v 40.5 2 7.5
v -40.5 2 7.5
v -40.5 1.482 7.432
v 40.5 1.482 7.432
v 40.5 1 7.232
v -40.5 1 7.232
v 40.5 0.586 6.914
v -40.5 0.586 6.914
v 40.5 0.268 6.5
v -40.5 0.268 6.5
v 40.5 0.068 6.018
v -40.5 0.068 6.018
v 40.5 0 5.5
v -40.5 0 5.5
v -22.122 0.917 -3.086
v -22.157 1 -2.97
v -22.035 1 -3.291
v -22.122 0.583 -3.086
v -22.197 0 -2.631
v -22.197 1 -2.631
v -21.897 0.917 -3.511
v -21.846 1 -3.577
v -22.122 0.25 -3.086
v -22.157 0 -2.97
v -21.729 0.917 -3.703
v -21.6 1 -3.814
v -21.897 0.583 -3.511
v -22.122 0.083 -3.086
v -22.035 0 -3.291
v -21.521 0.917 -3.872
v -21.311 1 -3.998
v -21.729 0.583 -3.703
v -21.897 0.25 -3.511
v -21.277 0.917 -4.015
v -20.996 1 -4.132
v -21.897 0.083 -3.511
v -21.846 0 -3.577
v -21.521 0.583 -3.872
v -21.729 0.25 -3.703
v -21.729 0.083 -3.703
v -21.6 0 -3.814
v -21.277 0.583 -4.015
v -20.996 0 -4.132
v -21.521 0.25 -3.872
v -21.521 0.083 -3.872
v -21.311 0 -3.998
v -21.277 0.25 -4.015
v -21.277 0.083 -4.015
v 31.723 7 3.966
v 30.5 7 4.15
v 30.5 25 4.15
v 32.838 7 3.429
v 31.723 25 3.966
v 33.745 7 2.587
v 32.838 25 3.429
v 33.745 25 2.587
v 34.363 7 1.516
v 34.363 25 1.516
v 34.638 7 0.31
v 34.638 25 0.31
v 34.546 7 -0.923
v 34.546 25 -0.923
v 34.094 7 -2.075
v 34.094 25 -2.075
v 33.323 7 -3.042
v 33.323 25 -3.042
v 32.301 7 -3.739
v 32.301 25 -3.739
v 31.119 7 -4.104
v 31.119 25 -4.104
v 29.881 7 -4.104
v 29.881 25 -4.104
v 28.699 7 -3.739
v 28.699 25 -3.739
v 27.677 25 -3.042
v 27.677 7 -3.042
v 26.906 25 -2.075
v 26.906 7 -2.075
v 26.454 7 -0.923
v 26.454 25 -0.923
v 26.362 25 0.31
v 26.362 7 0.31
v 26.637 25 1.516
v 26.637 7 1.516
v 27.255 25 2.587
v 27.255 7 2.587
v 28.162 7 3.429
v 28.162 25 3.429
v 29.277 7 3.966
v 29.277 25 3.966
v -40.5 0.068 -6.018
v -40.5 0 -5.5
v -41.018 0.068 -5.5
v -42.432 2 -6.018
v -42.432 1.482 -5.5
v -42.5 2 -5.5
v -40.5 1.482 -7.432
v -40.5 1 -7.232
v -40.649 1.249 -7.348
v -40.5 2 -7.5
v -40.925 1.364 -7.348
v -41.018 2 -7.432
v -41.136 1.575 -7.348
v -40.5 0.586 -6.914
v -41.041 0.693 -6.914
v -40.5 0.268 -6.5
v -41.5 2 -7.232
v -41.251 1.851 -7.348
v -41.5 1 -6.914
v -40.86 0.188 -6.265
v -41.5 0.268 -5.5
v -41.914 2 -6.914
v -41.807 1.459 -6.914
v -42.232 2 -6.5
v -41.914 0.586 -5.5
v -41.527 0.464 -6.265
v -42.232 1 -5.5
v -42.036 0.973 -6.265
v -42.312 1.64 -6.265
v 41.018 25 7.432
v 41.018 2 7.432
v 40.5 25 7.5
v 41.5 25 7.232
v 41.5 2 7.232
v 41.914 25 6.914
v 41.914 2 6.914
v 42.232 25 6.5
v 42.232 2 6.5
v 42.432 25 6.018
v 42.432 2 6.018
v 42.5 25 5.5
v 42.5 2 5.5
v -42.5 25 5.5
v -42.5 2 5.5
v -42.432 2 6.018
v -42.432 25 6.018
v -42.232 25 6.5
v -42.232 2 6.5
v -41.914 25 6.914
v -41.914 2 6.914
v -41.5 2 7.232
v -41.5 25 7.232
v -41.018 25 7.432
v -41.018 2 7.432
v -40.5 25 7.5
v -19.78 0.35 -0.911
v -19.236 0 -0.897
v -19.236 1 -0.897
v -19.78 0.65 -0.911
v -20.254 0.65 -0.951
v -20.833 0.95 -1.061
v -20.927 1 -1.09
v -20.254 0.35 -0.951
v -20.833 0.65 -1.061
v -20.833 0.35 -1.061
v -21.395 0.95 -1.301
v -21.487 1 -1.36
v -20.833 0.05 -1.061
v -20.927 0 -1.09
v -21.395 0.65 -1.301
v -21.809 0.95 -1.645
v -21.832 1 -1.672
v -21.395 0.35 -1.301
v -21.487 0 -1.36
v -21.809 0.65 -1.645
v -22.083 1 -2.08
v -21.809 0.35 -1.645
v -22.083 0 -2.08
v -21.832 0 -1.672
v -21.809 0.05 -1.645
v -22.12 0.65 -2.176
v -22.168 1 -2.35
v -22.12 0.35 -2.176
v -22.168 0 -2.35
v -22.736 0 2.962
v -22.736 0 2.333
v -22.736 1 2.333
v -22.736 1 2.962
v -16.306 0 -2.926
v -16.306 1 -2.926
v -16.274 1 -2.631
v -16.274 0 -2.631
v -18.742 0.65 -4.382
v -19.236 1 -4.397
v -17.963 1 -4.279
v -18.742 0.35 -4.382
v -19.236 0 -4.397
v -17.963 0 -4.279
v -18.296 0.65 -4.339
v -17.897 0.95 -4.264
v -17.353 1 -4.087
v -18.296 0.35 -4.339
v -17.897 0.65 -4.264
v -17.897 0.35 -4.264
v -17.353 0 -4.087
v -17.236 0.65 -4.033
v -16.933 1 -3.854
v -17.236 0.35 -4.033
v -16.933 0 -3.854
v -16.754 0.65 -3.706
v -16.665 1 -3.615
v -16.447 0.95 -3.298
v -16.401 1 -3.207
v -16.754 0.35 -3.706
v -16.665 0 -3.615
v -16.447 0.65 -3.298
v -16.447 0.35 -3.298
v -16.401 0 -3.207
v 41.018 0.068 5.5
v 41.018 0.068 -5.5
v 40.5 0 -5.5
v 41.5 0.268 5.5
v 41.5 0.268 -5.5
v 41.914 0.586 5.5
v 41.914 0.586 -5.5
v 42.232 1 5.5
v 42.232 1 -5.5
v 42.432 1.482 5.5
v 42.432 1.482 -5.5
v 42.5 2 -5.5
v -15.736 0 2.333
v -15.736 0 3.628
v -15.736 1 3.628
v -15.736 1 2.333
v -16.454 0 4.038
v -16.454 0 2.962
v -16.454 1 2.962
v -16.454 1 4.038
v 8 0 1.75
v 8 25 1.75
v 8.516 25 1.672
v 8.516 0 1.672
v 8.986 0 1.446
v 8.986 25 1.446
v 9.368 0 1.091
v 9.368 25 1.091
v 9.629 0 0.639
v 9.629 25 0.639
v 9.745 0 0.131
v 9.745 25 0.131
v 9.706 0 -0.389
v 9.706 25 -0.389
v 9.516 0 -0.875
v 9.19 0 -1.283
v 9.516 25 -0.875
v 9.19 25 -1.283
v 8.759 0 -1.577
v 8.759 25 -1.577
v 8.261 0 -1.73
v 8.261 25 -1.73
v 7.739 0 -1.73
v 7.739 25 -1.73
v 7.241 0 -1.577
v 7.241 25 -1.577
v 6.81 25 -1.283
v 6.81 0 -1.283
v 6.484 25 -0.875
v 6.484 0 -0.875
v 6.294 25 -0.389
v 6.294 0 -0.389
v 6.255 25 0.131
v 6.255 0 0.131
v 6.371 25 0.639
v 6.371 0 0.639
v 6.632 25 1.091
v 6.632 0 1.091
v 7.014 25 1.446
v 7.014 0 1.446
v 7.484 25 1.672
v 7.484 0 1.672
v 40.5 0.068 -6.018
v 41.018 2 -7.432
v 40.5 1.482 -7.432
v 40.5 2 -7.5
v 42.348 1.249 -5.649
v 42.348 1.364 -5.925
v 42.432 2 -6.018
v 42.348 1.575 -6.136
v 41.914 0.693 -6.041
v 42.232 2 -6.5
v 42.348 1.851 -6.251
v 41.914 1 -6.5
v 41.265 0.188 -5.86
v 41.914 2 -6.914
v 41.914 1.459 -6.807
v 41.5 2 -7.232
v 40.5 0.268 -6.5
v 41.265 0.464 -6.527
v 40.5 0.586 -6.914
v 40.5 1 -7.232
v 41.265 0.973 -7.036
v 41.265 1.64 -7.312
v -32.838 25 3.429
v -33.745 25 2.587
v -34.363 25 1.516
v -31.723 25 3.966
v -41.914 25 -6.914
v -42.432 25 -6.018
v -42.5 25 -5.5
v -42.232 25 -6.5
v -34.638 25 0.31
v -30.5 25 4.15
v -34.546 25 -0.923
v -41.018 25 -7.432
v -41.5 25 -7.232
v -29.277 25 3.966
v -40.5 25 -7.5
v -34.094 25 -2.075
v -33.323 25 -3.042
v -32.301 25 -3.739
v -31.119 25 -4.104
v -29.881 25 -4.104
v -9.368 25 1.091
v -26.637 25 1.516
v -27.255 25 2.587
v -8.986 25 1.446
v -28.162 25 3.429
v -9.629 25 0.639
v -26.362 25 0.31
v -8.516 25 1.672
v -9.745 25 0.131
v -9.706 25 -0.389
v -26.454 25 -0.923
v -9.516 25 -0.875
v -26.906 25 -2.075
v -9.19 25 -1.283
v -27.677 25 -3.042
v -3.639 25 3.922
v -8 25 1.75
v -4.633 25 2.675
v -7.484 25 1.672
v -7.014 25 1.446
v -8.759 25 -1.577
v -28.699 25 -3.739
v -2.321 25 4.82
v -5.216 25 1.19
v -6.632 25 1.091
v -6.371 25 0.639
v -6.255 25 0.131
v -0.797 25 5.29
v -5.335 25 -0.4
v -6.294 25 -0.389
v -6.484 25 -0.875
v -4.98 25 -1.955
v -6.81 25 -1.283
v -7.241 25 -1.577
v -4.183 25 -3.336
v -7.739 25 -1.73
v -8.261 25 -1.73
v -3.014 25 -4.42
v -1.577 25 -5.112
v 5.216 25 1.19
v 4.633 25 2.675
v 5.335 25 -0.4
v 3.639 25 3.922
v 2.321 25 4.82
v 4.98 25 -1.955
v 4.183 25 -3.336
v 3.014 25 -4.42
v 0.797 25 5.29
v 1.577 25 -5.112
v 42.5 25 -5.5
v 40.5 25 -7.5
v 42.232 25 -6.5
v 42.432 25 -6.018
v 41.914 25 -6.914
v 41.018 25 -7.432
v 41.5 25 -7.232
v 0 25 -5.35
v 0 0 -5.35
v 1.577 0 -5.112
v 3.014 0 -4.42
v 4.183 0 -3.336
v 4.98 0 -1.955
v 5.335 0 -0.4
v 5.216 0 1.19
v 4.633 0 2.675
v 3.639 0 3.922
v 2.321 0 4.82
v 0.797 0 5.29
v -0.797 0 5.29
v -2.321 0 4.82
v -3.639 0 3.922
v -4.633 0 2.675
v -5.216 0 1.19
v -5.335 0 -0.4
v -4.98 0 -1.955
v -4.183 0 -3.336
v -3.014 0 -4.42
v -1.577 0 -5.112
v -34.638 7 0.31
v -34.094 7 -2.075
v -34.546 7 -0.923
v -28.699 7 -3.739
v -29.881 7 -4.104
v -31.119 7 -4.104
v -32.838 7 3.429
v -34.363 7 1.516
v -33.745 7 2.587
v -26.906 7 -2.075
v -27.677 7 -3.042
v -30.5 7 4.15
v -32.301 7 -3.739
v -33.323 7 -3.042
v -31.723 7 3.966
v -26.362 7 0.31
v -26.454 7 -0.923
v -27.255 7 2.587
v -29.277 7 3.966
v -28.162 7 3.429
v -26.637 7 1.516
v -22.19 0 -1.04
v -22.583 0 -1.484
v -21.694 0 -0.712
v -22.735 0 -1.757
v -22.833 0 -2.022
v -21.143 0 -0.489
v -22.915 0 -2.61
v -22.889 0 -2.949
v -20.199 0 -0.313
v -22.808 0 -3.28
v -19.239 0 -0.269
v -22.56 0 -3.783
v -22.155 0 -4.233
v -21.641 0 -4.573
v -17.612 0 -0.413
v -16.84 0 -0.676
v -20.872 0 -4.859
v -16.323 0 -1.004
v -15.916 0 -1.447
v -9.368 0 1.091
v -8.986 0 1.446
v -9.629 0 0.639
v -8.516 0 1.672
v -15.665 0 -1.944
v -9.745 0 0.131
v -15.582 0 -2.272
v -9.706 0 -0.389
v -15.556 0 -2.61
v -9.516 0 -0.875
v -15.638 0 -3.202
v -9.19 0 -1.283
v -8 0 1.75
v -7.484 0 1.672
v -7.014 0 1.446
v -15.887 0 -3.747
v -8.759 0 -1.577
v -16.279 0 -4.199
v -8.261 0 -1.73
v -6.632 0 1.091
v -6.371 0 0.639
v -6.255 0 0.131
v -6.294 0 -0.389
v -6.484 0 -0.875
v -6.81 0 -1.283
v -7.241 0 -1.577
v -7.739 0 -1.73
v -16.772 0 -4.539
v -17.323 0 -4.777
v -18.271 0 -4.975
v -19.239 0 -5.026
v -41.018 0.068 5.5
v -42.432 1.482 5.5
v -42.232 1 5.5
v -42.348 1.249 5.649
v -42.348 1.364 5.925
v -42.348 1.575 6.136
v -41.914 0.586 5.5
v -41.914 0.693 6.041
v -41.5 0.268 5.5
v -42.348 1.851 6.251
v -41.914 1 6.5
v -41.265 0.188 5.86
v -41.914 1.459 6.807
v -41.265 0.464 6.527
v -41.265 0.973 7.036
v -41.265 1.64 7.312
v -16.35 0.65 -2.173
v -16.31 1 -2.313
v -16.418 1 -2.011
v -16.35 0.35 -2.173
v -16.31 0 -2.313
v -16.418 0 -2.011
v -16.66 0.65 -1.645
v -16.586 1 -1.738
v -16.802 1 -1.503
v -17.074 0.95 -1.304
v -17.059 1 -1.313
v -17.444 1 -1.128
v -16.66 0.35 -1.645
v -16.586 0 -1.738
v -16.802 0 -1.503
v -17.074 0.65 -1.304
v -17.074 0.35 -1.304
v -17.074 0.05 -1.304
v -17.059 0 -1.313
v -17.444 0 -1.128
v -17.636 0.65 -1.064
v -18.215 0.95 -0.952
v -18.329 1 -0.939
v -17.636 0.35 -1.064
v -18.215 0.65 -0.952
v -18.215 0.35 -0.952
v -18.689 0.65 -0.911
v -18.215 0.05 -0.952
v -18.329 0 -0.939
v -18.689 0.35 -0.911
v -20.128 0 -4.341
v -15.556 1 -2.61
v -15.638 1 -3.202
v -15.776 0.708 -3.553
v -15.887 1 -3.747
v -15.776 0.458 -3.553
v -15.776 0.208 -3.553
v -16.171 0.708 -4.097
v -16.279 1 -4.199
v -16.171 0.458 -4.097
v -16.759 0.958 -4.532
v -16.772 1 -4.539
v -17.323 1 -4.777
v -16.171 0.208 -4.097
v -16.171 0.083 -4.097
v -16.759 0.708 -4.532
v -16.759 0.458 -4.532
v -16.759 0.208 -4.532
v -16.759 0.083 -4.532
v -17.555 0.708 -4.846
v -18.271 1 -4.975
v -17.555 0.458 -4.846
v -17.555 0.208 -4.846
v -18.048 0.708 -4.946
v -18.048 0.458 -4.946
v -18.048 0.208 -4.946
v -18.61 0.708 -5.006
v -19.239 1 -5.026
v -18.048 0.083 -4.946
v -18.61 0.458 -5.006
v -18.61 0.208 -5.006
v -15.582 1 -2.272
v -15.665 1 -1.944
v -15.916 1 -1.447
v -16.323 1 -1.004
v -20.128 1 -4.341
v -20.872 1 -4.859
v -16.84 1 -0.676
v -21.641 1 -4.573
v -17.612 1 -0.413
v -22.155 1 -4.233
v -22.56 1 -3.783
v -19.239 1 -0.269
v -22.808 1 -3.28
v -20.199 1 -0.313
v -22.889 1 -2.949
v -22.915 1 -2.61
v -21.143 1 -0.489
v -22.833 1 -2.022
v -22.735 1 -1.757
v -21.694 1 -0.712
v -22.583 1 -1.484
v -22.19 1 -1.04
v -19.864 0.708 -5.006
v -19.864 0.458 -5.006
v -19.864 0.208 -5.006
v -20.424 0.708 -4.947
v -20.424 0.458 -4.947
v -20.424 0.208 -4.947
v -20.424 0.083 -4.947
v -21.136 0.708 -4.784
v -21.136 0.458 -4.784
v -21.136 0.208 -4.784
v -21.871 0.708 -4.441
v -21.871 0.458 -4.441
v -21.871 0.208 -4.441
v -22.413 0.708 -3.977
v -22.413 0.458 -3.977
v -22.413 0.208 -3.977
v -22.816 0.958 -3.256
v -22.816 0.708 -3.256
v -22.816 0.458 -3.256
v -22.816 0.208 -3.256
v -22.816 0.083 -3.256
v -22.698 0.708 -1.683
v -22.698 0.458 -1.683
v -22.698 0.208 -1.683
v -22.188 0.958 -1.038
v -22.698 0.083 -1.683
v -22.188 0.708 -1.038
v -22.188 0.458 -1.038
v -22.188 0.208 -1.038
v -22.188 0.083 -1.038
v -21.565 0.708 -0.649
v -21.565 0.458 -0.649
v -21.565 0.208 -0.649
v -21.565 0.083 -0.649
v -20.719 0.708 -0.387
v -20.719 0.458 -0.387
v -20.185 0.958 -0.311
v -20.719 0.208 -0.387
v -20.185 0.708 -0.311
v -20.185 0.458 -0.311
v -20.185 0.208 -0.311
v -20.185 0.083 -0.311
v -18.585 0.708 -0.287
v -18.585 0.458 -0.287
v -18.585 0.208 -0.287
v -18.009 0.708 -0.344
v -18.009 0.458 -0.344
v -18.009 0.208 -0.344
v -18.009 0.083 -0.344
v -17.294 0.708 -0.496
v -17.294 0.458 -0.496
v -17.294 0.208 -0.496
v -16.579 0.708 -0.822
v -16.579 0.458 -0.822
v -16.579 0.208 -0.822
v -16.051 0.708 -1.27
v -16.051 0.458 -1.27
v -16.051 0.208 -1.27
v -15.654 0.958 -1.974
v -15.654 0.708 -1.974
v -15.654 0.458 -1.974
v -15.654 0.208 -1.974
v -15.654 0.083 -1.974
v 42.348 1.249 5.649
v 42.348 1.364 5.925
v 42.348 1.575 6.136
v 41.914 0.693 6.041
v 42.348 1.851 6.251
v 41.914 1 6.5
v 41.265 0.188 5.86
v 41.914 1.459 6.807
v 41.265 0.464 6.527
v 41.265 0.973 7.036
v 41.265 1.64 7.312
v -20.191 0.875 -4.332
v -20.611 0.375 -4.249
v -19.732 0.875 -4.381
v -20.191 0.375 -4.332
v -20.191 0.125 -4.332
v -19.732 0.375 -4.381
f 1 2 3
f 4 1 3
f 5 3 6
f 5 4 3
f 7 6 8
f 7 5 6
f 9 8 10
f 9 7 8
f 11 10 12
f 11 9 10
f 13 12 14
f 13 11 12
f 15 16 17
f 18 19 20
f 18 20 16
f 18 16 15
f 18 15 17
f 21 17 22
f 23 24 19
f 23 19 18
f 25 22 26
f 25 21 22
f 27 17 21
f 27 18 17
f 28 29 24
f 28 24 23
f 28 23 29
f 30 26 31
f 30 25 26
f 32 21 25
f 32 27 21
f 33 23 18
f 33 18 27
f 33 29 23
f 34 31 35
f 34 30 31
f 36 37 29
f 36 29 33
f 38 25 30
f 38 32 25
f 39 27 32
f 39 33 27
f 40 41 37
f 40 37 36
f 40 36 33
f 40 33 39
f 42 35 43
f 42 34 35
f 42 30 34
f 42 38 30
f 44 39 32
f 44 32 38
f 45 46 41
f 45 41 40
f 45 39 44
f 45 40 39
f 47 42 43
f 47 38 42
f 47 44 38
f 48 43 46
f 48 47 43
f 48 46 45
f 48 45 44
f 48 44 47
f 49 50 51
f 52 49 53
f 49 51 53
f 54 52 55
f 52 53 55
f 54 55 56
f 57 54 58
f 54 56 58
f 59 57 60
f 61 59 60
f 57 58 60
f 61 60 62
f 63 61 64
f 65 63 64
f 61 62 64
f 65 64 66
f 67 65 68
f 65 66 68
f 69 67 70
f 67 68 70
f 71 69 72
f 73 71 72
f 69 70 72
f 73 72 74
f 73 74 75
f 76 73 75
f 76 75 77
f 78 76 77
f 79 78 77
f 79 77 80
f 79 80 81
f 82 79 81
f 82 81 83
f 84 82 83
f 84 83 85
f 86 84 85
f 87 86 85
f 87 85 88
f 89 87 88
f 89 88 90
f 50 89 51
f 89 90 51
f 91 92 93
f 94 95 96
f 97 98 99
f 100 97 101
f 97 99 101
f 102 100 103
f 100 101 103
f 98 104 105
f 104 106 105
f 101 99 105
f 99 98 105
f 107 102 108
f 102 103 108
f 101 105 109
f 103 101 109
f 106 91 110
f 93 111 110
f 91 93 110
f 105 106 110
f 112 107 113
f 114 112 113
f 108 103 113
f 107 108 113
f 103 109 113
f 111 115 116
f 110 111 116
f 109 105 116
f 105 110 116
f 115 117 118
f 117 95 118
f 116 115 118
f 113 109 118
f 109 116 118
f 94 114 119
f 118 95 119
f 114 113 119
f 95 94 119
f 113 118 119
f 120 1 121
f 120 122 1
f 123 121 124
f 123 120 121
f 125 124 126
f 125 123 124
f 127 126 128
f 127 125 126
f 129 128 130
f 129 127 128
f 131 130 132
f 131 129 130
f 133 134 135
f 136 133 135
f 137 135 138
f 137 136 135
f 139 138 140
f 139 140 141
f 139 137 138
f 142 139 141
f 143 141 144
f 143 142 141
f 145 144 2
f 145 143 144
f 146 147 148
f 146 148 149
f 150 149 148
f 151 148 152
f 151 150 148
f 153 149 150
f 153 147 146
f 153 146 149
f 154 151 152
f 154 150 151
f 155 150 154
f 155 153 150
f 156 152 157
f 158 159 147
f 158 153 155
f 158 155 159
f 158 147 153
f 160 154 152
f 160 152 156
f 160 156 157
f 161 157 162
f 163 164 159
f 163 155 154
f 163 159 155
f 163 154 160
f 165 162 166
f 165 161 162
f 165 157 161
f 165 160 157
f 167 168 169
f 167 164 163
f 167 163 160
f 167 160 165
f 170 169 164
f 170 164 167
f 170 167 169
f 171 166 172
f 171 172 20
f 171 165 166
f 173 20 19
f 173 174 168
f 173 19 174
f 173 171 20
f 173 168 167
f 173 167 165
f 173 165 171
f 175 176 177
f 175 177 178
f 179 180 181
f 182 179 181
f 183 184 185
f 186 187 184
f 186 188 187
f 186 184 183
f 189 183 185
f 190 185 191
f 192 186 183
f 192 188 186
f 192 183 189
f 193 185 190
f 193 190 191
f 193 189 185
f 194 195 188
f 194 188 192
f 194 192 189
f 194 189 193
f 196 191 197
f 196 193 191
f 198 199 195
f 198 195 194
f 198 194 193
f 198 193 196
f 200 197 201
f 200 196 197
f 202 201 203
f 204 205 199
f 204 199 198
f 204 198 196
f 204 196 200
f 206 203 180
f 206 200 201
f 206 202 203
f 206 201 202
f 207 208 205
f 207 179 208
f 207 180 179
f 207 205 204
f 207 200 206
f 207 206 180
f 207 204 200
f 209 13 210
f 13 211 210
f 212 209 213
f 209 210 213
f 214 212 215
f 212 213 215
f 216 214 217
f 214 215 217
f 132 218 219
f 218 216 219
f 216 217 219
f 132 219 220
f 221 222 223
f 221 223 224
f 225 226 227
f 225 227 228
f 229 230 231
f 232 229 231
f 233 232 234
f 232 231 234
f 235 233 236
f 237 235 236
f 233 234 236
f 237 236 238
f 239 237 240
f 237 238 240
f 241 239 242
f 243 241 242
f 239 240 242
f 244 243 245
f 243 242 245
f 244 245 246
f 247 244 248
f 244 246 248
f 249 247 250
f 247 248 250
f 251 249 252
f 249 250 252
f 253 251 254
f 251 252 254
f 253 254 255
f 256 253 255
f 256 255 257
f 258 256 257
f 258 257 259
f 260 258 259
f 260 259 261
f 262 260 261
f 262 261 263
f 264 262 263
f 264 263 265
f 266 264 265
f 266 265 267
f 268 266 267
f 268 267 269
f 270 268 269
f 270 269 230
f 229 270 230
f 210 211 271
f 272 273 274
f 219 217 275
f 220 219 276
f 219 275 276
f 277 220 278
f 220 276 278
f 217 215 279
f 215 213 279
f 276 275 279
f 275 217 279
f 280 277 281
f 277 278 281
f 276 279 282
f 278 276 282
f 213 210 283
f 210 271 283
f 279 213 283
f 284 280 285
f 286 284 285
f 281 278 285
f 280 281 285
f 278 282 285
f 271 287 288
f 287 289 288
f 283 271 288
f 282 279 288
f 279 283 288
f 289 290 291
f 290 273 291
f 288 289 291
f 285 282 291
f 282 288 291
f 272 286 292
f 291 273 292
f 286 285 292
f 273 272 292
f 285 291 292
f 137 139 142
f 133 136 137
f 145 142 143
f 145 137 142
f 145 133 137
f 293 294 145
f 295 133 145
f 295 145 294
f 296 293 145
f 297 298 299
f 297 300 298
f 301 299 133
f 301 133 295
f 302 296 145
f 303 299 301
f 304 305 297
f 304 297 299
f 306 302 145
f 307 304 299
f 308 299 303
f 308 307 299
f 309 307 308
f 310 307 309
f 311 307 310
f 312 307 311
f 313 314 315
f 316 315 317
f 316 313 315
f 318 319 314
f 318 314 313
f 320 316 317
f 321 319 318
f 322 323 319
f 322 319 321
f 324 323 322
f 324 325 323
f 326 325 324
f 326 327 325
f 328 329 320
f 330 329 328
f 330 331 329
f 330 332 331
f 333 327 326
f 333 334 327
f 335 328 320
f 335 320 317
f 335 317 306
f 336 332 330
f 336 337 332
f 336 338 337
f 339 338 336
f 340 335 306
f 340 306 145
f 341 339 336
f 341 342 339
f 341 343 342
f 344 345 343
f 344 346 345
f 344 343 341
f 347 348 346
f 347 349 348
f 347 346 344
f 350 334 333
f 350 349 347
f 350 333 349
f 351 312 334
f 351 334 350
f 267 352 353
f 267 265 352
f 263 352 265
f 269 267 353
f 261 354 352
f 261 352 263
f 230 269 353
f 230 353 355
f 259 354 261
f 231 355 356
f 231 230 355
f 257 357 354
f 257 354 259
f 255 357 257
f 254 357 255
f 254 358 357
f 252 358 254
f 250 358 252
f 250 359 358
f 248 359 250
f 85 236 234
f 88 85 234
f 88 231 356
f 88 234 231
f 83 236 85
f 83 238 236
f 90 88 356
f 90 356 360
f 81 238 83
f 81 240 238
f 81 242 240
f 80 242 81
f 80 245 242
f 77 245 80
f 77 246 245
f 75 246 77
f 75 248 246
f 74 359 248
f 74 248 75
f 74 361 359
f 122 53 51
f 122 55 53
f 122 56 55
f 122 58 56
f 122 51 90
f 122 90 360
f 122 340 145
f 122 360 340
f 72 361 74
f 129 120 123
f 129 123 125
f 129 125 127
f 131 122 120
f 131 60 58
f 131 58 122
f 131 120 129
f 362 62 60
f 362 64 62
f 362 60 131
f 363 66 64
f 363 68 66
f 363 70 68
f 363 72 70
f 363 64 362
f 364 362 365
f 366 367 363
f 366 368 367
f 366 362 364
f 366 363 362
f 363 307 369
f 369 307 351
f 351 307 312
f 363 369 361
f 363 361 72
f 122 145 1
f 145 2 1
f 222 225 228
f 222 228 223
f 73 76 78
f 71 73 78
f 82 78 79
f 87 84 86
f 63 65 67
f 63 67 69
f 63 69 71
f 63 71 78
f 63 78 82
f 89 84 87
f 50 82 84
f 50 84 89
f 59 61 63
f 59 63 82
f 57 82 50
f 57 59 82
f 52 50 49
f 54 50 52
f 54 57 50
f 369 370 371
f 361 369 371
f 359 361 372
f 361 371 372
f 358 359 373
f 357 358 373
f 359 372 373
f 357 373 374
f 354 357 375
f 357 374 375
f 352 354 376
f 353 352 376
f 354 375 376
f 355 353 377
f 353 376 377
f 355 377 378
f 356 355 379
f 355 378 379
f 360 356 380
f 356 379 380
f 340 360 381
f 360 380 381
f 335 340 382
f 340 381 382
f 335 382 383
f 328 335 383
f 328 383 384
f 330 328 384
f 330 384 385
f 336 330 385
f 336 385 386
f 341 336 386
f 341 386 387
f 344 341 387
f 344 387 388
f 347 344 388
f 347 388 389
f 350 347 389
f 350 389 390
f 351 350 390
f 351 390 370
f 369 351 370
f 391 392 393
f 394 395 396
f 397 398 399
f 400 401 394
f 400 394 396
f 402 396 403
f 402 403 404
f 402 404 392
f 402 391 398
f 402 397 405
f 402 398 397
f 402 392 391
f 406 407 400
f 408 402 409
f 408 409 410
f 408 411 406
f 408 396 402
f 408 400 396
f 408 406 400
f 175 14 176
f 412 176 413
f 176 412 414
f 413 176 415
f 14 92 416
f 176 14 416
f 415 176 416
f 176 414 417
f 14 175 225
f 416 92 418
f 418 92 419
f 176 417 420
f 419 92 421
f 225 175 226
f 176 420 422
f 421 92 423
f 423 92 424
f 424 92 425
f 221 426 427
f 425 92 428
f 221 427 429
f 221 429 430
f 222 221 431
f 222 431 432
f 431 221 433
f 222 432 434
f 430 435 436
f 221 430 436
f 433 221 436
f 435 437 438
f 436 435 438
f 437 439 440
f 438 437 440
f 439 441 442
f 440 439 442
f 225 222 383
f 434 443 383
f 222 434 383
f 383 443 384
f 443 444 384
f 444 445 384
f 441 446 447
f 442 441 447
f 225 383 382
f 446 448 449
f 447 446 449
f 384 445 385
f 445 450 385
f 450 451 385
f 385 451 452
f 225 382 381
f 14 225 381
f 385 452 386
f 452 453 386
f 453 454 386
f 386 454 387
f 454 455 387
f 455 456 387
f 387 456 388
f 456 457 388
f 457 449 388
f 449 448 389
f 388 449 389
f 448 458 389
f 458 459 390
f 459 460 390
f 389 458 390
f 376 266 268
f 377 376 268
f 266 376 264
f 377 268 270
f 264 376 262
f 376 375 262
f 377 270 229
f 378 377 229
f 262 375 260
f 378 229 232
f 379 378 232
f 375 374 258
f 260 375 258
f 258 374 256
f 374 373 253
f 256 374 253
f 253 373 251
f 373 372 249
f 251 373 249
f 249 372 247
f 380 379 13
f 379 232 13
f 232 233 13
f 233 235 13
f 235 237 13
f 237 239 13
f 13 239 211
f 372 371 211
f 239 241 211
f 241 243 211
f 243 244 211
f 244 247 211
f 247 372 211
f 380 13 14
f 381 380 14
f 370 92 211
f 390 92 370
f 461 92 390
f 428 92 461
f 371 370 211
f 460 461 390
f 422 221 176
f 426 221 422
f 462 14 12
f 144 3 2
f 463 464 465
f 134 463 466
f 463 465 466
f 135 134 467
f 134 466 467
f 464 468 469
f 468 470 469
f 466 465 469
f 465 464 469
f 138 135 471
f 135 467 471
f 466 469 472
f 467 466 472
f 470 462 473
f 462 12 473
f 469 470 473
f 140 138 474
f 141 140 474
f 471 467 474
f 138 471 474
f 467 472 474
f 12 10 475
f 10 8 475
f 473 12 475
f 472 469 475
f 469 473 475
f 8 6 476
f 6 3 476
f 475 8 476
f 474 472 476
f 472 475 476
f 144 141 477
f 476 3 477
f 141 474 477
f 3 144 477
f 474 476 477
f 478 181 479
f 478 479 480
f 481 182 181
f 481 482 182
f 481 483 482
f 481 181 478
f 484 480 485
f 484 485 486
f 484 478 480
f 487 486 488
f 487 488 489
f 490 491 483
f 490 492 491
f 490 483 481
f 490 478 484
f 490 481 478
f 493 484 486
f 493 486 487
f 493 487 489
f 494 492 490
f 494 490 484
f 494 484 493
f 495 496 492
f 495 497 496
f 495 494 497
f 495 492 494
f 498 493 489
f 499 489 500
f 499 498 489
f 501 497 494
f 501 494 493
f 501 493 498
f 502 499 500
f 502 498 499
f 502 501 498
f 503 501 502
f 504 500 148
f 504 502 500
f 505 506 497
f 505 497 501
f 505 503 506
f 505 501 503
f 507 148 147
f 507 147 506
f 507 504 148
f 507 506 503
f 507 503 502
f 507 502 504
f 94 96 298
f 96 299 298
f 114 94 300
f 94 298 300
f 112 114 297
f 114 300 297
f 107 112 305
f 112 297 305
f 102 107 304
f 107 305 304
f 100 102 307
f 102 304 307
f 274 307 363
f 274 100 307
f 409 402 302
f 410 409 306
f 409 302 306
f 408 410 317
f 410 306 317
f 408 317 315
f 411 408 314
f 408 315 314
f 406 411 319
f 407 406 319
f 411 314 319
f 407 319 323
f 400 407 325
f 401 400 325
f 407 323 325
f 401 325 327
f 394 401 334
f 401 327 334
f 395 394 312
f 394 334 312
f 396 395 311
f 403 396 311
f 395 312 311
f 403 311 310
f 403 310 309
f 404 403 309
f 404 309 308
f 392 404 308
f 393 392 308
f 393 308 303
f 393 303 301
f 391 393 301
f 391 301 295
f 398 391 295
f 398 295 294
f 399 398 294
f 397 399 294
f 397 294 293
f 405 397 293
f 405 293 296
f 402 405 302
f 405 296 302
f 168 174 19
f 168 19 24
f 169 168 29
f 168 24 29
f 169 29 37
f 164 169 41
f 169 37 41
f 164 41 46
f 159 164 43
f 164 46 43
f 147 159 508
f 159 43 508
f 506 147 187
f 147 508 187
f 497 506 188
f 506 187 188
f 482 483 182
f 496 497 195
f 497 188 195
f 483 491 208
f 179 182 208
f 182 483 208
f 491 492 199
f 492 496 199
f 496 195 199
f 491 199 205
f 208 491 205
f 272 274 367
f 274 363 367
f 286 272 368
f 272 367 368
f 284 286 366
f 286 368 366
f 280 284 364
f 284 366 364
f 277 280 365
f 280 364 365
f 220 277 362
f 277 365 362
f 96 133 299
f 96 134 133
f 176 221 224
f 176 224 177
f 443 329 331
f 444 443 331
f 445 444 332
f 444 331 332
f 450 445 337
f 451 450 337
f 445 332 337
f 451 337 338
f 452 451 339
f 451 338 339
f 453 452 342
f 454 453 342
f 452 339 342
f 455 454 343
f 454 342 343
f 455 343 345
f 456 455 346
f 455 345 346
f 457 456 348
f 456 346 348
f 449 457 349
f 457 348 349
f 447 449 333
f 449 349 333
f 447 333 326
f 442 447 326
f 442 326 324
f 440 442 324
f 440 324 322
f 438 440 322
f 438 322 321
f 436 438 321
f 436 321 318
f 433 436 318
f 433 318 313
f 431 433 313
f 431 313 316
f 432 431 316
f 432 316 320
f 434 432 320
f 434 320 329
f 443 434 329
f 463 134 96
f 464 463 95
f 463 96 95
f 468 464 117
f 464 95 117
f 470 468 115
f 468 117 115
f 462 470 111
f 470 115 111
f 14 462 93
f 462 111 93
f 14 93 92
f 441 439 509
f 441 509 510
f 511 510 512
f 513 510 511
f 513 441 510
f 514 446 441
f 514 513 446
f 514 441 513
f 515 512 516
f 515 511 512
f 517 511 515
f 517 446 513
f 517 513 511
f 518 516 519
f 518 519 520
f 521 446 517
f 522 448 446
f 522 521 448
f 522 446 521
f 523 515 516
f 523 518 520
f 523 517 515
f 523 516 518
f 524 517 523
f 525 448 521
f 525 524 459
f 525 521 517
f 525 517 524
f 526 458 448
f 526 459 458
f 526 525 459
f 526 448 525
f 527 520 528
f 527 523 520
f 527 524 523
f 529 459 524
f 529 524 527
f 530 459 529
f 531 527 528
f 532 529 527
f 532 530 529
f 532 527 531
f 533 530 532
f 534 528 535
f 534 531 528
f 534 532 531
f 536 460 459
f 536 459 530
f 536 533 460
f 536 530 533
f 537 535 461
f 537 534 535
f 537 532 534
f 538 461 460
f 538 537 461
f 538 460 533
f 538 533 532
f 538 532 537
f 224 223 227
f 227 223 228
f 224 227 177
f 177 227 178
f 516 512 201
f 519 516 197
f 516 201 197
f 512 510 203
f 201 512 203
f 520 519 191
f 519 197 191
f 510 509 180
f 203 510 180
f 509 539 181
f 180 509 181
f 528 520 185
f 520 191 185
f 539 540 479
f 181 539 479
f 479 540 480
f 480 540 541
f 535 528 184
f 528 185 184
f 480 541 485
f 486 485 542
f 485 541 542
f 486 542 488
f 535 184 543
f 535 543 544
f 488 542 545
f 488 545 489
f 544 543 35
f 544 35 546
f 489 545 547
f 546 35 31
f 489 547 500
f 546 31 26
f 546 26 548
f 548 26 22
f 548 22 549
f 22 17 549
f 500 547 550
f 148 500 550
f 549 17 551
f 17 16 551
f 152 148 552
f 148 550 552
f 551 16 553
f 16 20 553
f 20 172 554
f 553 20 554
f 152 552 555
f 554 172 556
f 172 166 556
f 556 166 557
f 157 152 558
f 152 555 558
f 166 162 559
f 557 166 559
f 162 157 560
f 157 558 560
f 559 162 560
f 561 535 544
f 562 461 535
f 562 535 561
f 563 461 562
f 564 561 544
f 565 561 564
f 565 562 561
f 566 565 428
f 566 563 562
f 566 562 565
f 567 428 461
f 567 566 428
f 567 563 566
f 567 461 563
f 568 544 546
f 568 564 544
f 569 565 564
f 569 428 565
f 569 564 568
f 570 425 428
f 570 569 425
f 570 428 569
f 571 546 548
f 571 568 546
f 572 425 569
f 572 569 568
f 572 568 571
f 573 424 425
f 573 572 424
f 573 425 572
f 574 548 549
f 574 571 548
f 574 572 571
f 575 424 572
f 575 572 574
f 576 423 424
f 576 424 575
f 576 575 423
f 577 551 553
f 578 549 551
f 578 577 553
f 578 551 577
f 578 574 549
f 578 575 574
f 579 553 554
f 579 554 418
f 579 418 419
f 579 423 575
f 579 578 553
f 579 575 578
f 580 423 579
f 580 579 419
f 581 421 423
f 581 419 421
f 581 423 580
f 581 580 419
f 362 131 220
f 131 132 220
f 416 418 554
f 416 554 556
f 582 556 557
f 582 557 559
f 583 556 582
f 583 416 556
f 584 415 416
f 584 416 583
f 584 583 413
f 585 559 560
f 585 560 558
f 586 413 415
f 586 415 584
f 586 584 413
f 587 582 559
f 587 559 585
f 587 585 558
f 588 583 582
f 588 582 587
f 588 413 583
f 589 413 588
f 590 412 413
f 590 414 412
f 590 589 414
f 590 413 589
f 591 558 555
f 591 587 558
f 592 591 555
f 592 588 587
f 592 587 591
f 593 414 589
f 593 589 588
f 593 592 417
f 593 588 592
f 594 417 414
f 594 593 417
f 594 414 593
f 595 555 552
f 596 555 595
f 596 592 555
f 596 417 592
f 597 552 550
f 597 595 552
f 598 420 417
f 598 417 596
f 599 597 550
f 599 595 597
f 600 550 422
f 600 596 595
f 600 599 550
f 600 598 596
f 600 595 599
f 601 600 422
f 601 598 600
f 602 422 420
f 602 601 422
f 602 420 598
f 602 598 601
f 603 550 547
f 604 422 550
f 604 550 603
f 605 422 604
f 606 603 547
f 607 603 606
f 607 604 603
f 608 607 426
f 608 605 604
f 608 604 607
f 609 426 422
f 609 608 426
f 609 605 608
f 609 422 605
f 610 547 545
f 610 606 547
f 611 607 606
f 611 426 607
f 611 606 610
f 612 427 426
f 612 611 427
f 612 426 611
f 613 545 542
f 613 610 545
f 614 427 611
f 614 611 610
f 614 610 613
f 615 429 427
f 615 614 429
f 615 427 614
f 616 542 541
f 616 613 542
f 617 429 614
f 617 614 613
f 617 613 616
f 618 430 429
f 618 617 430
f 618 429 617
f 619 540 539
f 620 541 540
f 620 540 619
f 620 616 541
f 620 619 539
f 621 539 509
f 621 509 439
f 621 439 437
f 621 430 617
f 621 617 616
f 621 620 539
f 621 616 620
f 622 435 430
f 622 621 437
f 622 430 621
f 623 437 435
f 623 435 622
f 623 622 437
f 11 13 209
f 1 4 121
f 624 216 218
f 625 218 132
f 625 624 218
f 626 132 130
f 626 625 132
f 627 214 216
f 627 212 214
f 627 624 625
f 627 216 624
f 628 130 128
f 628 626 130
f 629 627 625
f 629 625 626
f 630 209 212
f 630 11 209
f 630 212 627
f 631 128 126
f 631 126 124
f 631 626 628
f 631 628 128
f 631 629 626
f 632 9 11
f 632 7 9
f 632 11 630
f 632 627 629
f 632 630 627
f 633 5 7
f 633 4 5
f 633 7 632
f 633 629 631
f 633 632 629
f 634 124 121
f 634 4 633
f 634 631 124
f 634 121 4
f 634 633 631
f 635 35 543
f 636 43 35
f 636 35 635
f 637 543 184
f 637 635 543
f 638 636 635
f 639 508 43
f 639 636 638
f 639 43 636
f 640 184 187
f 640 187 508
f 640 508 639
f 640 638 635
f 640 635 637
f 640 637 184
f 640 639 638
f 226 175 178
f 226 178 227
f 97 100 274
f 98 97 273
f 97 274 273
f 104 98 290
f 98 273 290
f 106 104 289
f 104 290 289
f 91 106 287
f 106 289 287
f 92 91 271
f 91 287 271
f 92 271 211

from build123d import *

# Parameters (mm, degrees)
CROQUIS1_W              = 85
CROQUIS1_H              = 15
SALIENTE_EXTRUIR1_DEPTH = 25
CROQUIS2_R              = 5.35
CORTAR_EXTRUIR1_DEPTH   = 50.874843358
CROQUIS3_R              = 4.15
CORTAR_EXTRUIR2_DEPTH   = 18
REDONDEO1_R             = 2
CROQUIS6_R              = 1.75
CORTAR_EXTRUIR4_DEPTH   = 50.874843358
CORTAR_EXTRUIR7_DEPTH   = 1


with BuildPart() as part:
    # Croquis1 → Saliente-Extruir1 (new body)
    with BuildSketch(Plane(origin=(0, 0, 0), x_dir=(1, 0, 0), z_dir=(0, 1, 0))):
        Rectangle(CROQUIS1_W, CROQUIS1_H)
    extrude(amount=SALIENTE_EXTRUIR1_DEPTH)

    # Croquis2 → Cortar-Extruir1 (cut, through all)
    with BuildSketch(Plane(origin=(0, 0, 0), x_dir=(-1, 0, 0), z_dir=(0, -1, 0))):
        with Locations(Location((0, 0, 0), (0, 0, 90))):
            Circle(CROQUIS2_R)
    extrude(amount=-CORTAR_EXTRUIR1_DEPTH, mode=Mode.SUBTRACT)

    # Croquis3 → Cortar-Extruir2 (cut)
    with BuildSketch(Plane(origin=(0, 25, 0), x_dir=(1, 0, 0), z_dir=(0, 1, 0))):
        with Locations(Location((-30.5, 0, 0), (0, 0, 270))):
            Circle(CROQUIS3_R)
        with Locations(Location((30.5, 0, 0), (0, 0, 270))):
            Circle(CROQUIS3_R)
    extrude(amount=-CORTAR_EXTRUIR2_DEPTH, mode=Mode.SUBTRACT)

    # Redondeo1
    redondeo1_edges = [part.edges().sort_by_distance(p)[0] for p in [
        (0, 0, 7.5),
        (-42.5, 0, 0),
        (0, 0, -7.5),
        (42.5, 0, 0),
        (42.5, 12.5, 7.5),
        (-42.5, 12.5, 7.5),
        (-42.5, 12.5, -7.5),
        (42.5, 12.5, -7.5),
    ]]
    fillet(redondeo1_edges, radius=REDONDEO1_R)

    # Croquis6 → Cortar-Extruir4 (cut, through all)
    with BuildSketch(Plane(origin=(0, 25, 0), x_dir=(1, 0, 0), z_dir=(0, 1, 0))):
        with Locations(Location((8, 0, 0), (0, 0, 270))):
            Circle(CROQUIS6_R)
        with Locations(Location((-8, 0, 0), (0, 0, 270))):
            Circle(CROQUIS6_R)
    extrude(amount=-CORTAR_EXTRUIR4_DEPTH, mode=Mode.SUBTRACT)

    # Croquis7 → Cortar-Extruir7 (cut)
    # profile 1 of 2: a face of its own
    with BuildSketch(Plane.XZ):
        Polygon((-15.735816649, 3.627604167), (-15.735816649, 2.333333333), (-22.735816649, 2.333333333), (-22.735816649, 2.961538462), (-16.453765367, 2.961538462), (-16.453765367, 4.038461538), align=None)
    # profile 2 of 2: a face of its own
    with BuildSketch(Plane.XZ):
        with BuildLine():
            add(Edge.make_bspline(
                [(-19.238621136, -0.269230769), (-19.126426361, -0.269886806), (-18.908486392, -0.271161165), (-18.590917108, -0.285338008), (-18.292996529, -0.308888691), (-18.014710402, -0.341163442), (-17.755986857, -0.380439385), (-17.517517395, -0.432870416), (-17.298198005, -0.492495828), (-17.097314503, -0.56160137), (-16.912157049, -0.639574708), (-16.739313868, -0.724451126), (-16.579004397, -0.819552716), (-16.428820359, -0.919606638), (-16.290437881, -1.02826913), (-16.164119024, -1.144394069), (-16.049787516, -1.269133369), (-15.946082617, -1.40001997), (-15.85574243, -1.537881039), (-15.774339916, -1.678466778), (-15.707527896, -1.824257937), (-15.652629856, -1.973924855), (-15.608641448, -2.127032284), (-15.578179561, -2.284212853), (-15.559088147, -2.445504533), (-15.557257753, -2.554366181), (-15.556329469, -2.609575321)],
                knots=[0, 0, 0, 0, 1.646377244, 3.198111528, 4.663803227, 6.031090796, 7.308794487, 8.502186765, 9.612154809, 10.642545331, 11.617106989, 12.558866172, 13.465886467, 14.35053239, 15.20542558, 16.045215227, 16.865619885, 17.686225247, 18.492864914, 19.282407821, 20.068097601, 20.842842034, 21.620163247, 22.403093475, 23.190129512, 24, 24, 24, 24], degree=3))
            add(Edge.make_bspline(
                [(-15.556329469, -2.609575321), (-15.5573051, -2.665246277), (-15.559245322, -2.775958295), (-15.577893207, -2.939639046), (-15.608835453, -3.099538409), (-15.652677402, -3.254974687), (-15.707068755, -3.40722466), (-15.77524299, -3.555097475), (-15.854600724, -3.699511638), (-15.947848479, -3.838172213), (-16.051813031, -3.972601444), (-16.169338369, -4.09949737), (-16.299237807, -4.218871542), (-16.440121535, -4.332222152), (-16.594691705, -4.436333347), (-16.760259925, -4.535480211), (-16.939721654, -4.624224283), (-17.13008259, -4.709693633), (-17.336609907, -4.783467607), (-17.558139428, -4.850000097), (-17.797287802, -4.903758035), (-18.052800293, -4.948536579), (-18.325615259, -4.983226371), (-18.61514789, -5.008491655), (-18.921588672, -5.021837825), (-19.13110437, -5.024351228), (-19.238621136, -5.025641026)],
                knots=[0, 0, 0, 0, 0.810914788, 1.612654377, 2.396697861, 3.181598691, 3.963628158, 4.749916497, 5.551656086, 6.361998678, 7.18212741, 8.025565596, 8.878627764, 9.750805457, 10.657531673, 11.591944965, 12.560506719, 13.57287815, 14.630710178, 15.753379473, 16.941251878, 18.199788006, 19.531962791, 20.947069417, 22.433333509, 24, 24, 24, 24], degree=3))
            add(Edge.make_bspline(
                [(-19.238621136, -5.025641026), (-19.345668552, -5.024336246), (-19.554246076, -5.021793936), (-19.859313556, -5.008658775), (-20.147290215, -4.982663334), (-20.41897767, -4.950511076), (-20.672762824, -4.904710628), (-20.911058869, -4.85264359), (-21.131809347, -4.787929851), (-21.337247456, -4.71516142), (-21.526675746, -4.631546669), (-21.704586114, -4.542018264), (-21.870019237, -4.443479984), (-22.024587159, -4.338747894), (-22.166692715, -4.226360749), (-22.296687112, -4.106481098), (-22.414484608, -3.979017693), (-22.519869643, -3.844284532), (-22.612031928, -3.703442631), (-22.694410187, -3.559510505), (-22.761255036, -3.409615396), (-22.817693438, -3.257088604), (-22.861636248, -3.100490939), (-22.891723593, -2.939976001), (-22.912883478, -2.776069471), (-22.914494251, -2.665265538), (-22.915303828, -2.609575321)],
                knots=[0, 0, 0, 0, 1.56130642, 3.042141888, 4.451772327, 5.777565838, 7.030558081, 8.211376819, 9.333164717, 10.383253789, 11.387583522, 12.350962576, 13.286244149, 14.193812918, 15.072134482, 15.925989337, 16.770211267, 17.600669898, 18.417446232, 19.22325363, 20.01647746, 20.807971184, 21.593601364, 22.38506573, 23.188331689, 24, 24, 24, 24], degree=3))
            add(Edge.make_bspline(
                [(-22.915303828, -2.609575321), (-22.914366612, -2.554368424), (-22.912518605, -2.445511199), (-22.893556216, -2.284187121), (-22.86263495, -2.127251692), (-22.820644024, -1.974391185), (-22.767276046, -1.825292768), (-22.699393956, -1.681417008), (-22.620661292, -1.5408638), (-22.531088152, -1.404274494), (-22.428439667, -1.274252399), (-22.314913491, -1.150052566), (-22.187662157, -1.034810992), (-22.048722516, -0.927510387), (-21.899273474, -0.825687939), (-21.737842843, -0.731518276), (-21.563380224, -0.646807414), (-21.377200643, -0.567086628), (-21.174840747, -0.496812905), (-20.954351598, -0.435206972), (-20.7145135, -0.383849808), (-20.456038463, -0.342548111), (-20.178733027, -0.308499017), (-19.882108942, -0.285449523), (-19.566422129, -0.271149875), (-19.349882069, -0.269882145), (-19.238621136, -0.269230769)],
                knots=[0, 0, 0, 0, 0.810940842, 1.599017053, 2.38298203, 3.159479784, 3.926441347, 4.70693857, 5.494146311, 6.292334103, 7.104379492, 7.925868426, 8.762126819, 9.623561095, 10.503686106, 11.41783325, 12.366995289, 13.351843594, 14.392337808, 15.512229747, 16.713911458, 17.994391108, 19.357476964, 20.818259213, 22.365182633, 24, 24, 24, 24], degree=3))
        make_face()
        with BuildLine():
            add(Edge.make_bspline(
                [(-19.235816649, -0.897435897), (-19.329314047, -0.897674792), (-19.510774136, -0.898138438), (-19.774460658, -0.91025084), (-20.020401317, -0.926751302), (-20.248908385, -0.948033902), (-20.459208427, -0.97963978), (-20.652747737, -1.015053418), (-20.828502395, -1.058149393), (-20.987677411, -1.109140103), (-21.132977611, -1.167215999), (-21.268172835, -1.230635754), (-21.394902211, -1.298728786), (-21.511878588, -1.375068296), (-21.620266383, -1.457922738), (-21.719754119, -1.547428165), (-21.809907706, -1.643427165), (-21.916883678, -1.77632125), (-22.028736694, -1.950902188), (-22.124938828, -2.171995858), (-22.185786987, -2.39927863), (-22.19350354, -2.553588256), (-22.197355111, -2.630608974)],
                knots=[0, 0, 0, 0, 1.459116078, 2.831857795, 4.118796693, 5.306371758, 6.412361096, 7.436813035, 8.376339383, 9.234574298, 10.043323891, 10.816788787, 11.564361537, 12.286735248, 12.994408768, 13.691741332, 14.372975427, 15.047457468, 16.352811911, 17.594285292, 18.799233213, 20, 20, 20, 20], degree=3))
            add(Edge.make_bspline(
                [(-22.197355111, -2.630608974), (-22.194159549, -2.708124318), (-22.187775023, -2.862994964), (-22.126177549, -3.089262554), (-22.03323847, -3.308923094), (-21.923343459, -3.481066975), (-21.8186868, -3.612032062), (-21.729457503, -3.705866042), (-21.629545769, -3.791990139), (-21.521747177, -3.873674289), (-21.404002208, -3.94859244), (-21.276877058, -4.016718716), (-21.140018702, -4.078885411), (-21.044479224, -4.114303503), (-20.995632354, -4.132411859)],
                knots=[0, 0, 0, 0, 1.353760809, 2.704726607, 4.075137775, 5.516104923, 6.260822281, 7.007110065, 7.778089737, 8.566572457, 9.372053459, 10.217411131, 11.088608312, 12, 12, 12, 12], degree=3))
            add(Edge.make_bspline(
                [(-20.995632354, -4.132411859), (-20.933172875, -4.153515395), (-20.806353347, -4.196364622), (-20.609626043, -4.251588171), (-20.403220515, -4.295078969), (-20.188370281, -4.334205701), (-19.963490879, -4.360911812), (-19.729278111, -4.382407439), (-19.485555387, -4.395068813), (-19.319965404, -4.396638315), (-19.235816649, -4.397435897)],
                knots=[0, 0, 0, 0, 0.884706709, 1.796334032, 2.740027952, 3.714592787, 4.726048262, 5.777819803, 6.87074269, 8, 8, 8, 8], degree=3))
            add(Edge.make_bspline(
                [(-19.235816649, -4.397435897), (-19.151669702, -4.396556249), (-18.987039924, -4.394835257), (-18.746186408, -4.383528181), (-18.517027725, -4.365358649), (-18.299355986, -4.340766586), (-18.093558624, -4.307006884), (-17.899341146, -4.266464843), (-17.716755909, -4.218933951), (-17.545332043, -4.164414601), (-17.38568569, -4.102972048), (-17.237469269, -4.03509645), (-17.099897025, -3.962663991), (-16.973363843, -3.883976736), (-16.857298581, -3.799986068), (-16.754029437, -3.708470792), (-16.660355489, -3.613062092), (-16.553430354, -3.479427706), (-16.444406962, -3.304479133), (-16.344075443, -3.086787836), (-16.286458857, -2.860246548), (-16.278335483, -2.70709964), (-16.274278187, -2.630608974)],
                knots=[0, 0, 0, 0, 1.313668642, 2.570134578, 3.763346207, 4.902004944, 5.98888779, 7.017888835, 7.998425394, 8.933058446, 9.82474457, 10.667209444, 11.476765193, 12.250262638, 12.991704352, 13.7104269, 14.401925311, 15.076585796, 16.378385137, 17.609787933, 18.806186071, 20, 20, 20, 20], degree=3))
            add(Edge.make_bspline(
                [(-16.274278187, -2.630608974), (-16.278335846, -2.553184539), (-16.286458556, -2.39819462), (-16.343924357, -2.169347957), (-16.443472852, -1.950105943), (-16.554134391, -1.776560965), (-16.658462613, -1.643095185), (-16.749186831, -1.54884971), (-16.848975533, -1.460740005), (-16.956904441, -1.377816535), (-17.073939817, -1.301550513), (-17.200650763, -1.233429615), (-17.335858551, -1.170046263), (-17.481125692, -1.111845682), (-17.640540674, -1.061327523), (-17.815408316, -1.016173608), (-18.0091284, -0.980781455), (-18.220016384, -0.949896763), (-18.44880436, -0.926348938), (-18.695312028, -0.910293198), (-18.959454547, -0.898116523), (-19.141850896, -0.897667316), (-19.235816649, -0.897435897)],
                knots=[0, 0, 0, 0, 1.207964612, 2.418129846, 3.655795183, 4.951004962, 5.620895151, 6.296795572, 6.989224116, 7.696855977, 8.419187164, 9.166715907, 9.940135271, 10.748837255, 11.607021648, 12.548275234, 13.5654991, 14.678641405, 15.874140913, 17.15372626, 18.533675393, 20, 20, 20, 20], degree=3))
        make_face(mode=Mode.SUBTRACT)
    extrude(amount=-CORTAR_EXTRUIR7_DEPTH, mode=Mode.SUBTRACT)


solid = part.part
